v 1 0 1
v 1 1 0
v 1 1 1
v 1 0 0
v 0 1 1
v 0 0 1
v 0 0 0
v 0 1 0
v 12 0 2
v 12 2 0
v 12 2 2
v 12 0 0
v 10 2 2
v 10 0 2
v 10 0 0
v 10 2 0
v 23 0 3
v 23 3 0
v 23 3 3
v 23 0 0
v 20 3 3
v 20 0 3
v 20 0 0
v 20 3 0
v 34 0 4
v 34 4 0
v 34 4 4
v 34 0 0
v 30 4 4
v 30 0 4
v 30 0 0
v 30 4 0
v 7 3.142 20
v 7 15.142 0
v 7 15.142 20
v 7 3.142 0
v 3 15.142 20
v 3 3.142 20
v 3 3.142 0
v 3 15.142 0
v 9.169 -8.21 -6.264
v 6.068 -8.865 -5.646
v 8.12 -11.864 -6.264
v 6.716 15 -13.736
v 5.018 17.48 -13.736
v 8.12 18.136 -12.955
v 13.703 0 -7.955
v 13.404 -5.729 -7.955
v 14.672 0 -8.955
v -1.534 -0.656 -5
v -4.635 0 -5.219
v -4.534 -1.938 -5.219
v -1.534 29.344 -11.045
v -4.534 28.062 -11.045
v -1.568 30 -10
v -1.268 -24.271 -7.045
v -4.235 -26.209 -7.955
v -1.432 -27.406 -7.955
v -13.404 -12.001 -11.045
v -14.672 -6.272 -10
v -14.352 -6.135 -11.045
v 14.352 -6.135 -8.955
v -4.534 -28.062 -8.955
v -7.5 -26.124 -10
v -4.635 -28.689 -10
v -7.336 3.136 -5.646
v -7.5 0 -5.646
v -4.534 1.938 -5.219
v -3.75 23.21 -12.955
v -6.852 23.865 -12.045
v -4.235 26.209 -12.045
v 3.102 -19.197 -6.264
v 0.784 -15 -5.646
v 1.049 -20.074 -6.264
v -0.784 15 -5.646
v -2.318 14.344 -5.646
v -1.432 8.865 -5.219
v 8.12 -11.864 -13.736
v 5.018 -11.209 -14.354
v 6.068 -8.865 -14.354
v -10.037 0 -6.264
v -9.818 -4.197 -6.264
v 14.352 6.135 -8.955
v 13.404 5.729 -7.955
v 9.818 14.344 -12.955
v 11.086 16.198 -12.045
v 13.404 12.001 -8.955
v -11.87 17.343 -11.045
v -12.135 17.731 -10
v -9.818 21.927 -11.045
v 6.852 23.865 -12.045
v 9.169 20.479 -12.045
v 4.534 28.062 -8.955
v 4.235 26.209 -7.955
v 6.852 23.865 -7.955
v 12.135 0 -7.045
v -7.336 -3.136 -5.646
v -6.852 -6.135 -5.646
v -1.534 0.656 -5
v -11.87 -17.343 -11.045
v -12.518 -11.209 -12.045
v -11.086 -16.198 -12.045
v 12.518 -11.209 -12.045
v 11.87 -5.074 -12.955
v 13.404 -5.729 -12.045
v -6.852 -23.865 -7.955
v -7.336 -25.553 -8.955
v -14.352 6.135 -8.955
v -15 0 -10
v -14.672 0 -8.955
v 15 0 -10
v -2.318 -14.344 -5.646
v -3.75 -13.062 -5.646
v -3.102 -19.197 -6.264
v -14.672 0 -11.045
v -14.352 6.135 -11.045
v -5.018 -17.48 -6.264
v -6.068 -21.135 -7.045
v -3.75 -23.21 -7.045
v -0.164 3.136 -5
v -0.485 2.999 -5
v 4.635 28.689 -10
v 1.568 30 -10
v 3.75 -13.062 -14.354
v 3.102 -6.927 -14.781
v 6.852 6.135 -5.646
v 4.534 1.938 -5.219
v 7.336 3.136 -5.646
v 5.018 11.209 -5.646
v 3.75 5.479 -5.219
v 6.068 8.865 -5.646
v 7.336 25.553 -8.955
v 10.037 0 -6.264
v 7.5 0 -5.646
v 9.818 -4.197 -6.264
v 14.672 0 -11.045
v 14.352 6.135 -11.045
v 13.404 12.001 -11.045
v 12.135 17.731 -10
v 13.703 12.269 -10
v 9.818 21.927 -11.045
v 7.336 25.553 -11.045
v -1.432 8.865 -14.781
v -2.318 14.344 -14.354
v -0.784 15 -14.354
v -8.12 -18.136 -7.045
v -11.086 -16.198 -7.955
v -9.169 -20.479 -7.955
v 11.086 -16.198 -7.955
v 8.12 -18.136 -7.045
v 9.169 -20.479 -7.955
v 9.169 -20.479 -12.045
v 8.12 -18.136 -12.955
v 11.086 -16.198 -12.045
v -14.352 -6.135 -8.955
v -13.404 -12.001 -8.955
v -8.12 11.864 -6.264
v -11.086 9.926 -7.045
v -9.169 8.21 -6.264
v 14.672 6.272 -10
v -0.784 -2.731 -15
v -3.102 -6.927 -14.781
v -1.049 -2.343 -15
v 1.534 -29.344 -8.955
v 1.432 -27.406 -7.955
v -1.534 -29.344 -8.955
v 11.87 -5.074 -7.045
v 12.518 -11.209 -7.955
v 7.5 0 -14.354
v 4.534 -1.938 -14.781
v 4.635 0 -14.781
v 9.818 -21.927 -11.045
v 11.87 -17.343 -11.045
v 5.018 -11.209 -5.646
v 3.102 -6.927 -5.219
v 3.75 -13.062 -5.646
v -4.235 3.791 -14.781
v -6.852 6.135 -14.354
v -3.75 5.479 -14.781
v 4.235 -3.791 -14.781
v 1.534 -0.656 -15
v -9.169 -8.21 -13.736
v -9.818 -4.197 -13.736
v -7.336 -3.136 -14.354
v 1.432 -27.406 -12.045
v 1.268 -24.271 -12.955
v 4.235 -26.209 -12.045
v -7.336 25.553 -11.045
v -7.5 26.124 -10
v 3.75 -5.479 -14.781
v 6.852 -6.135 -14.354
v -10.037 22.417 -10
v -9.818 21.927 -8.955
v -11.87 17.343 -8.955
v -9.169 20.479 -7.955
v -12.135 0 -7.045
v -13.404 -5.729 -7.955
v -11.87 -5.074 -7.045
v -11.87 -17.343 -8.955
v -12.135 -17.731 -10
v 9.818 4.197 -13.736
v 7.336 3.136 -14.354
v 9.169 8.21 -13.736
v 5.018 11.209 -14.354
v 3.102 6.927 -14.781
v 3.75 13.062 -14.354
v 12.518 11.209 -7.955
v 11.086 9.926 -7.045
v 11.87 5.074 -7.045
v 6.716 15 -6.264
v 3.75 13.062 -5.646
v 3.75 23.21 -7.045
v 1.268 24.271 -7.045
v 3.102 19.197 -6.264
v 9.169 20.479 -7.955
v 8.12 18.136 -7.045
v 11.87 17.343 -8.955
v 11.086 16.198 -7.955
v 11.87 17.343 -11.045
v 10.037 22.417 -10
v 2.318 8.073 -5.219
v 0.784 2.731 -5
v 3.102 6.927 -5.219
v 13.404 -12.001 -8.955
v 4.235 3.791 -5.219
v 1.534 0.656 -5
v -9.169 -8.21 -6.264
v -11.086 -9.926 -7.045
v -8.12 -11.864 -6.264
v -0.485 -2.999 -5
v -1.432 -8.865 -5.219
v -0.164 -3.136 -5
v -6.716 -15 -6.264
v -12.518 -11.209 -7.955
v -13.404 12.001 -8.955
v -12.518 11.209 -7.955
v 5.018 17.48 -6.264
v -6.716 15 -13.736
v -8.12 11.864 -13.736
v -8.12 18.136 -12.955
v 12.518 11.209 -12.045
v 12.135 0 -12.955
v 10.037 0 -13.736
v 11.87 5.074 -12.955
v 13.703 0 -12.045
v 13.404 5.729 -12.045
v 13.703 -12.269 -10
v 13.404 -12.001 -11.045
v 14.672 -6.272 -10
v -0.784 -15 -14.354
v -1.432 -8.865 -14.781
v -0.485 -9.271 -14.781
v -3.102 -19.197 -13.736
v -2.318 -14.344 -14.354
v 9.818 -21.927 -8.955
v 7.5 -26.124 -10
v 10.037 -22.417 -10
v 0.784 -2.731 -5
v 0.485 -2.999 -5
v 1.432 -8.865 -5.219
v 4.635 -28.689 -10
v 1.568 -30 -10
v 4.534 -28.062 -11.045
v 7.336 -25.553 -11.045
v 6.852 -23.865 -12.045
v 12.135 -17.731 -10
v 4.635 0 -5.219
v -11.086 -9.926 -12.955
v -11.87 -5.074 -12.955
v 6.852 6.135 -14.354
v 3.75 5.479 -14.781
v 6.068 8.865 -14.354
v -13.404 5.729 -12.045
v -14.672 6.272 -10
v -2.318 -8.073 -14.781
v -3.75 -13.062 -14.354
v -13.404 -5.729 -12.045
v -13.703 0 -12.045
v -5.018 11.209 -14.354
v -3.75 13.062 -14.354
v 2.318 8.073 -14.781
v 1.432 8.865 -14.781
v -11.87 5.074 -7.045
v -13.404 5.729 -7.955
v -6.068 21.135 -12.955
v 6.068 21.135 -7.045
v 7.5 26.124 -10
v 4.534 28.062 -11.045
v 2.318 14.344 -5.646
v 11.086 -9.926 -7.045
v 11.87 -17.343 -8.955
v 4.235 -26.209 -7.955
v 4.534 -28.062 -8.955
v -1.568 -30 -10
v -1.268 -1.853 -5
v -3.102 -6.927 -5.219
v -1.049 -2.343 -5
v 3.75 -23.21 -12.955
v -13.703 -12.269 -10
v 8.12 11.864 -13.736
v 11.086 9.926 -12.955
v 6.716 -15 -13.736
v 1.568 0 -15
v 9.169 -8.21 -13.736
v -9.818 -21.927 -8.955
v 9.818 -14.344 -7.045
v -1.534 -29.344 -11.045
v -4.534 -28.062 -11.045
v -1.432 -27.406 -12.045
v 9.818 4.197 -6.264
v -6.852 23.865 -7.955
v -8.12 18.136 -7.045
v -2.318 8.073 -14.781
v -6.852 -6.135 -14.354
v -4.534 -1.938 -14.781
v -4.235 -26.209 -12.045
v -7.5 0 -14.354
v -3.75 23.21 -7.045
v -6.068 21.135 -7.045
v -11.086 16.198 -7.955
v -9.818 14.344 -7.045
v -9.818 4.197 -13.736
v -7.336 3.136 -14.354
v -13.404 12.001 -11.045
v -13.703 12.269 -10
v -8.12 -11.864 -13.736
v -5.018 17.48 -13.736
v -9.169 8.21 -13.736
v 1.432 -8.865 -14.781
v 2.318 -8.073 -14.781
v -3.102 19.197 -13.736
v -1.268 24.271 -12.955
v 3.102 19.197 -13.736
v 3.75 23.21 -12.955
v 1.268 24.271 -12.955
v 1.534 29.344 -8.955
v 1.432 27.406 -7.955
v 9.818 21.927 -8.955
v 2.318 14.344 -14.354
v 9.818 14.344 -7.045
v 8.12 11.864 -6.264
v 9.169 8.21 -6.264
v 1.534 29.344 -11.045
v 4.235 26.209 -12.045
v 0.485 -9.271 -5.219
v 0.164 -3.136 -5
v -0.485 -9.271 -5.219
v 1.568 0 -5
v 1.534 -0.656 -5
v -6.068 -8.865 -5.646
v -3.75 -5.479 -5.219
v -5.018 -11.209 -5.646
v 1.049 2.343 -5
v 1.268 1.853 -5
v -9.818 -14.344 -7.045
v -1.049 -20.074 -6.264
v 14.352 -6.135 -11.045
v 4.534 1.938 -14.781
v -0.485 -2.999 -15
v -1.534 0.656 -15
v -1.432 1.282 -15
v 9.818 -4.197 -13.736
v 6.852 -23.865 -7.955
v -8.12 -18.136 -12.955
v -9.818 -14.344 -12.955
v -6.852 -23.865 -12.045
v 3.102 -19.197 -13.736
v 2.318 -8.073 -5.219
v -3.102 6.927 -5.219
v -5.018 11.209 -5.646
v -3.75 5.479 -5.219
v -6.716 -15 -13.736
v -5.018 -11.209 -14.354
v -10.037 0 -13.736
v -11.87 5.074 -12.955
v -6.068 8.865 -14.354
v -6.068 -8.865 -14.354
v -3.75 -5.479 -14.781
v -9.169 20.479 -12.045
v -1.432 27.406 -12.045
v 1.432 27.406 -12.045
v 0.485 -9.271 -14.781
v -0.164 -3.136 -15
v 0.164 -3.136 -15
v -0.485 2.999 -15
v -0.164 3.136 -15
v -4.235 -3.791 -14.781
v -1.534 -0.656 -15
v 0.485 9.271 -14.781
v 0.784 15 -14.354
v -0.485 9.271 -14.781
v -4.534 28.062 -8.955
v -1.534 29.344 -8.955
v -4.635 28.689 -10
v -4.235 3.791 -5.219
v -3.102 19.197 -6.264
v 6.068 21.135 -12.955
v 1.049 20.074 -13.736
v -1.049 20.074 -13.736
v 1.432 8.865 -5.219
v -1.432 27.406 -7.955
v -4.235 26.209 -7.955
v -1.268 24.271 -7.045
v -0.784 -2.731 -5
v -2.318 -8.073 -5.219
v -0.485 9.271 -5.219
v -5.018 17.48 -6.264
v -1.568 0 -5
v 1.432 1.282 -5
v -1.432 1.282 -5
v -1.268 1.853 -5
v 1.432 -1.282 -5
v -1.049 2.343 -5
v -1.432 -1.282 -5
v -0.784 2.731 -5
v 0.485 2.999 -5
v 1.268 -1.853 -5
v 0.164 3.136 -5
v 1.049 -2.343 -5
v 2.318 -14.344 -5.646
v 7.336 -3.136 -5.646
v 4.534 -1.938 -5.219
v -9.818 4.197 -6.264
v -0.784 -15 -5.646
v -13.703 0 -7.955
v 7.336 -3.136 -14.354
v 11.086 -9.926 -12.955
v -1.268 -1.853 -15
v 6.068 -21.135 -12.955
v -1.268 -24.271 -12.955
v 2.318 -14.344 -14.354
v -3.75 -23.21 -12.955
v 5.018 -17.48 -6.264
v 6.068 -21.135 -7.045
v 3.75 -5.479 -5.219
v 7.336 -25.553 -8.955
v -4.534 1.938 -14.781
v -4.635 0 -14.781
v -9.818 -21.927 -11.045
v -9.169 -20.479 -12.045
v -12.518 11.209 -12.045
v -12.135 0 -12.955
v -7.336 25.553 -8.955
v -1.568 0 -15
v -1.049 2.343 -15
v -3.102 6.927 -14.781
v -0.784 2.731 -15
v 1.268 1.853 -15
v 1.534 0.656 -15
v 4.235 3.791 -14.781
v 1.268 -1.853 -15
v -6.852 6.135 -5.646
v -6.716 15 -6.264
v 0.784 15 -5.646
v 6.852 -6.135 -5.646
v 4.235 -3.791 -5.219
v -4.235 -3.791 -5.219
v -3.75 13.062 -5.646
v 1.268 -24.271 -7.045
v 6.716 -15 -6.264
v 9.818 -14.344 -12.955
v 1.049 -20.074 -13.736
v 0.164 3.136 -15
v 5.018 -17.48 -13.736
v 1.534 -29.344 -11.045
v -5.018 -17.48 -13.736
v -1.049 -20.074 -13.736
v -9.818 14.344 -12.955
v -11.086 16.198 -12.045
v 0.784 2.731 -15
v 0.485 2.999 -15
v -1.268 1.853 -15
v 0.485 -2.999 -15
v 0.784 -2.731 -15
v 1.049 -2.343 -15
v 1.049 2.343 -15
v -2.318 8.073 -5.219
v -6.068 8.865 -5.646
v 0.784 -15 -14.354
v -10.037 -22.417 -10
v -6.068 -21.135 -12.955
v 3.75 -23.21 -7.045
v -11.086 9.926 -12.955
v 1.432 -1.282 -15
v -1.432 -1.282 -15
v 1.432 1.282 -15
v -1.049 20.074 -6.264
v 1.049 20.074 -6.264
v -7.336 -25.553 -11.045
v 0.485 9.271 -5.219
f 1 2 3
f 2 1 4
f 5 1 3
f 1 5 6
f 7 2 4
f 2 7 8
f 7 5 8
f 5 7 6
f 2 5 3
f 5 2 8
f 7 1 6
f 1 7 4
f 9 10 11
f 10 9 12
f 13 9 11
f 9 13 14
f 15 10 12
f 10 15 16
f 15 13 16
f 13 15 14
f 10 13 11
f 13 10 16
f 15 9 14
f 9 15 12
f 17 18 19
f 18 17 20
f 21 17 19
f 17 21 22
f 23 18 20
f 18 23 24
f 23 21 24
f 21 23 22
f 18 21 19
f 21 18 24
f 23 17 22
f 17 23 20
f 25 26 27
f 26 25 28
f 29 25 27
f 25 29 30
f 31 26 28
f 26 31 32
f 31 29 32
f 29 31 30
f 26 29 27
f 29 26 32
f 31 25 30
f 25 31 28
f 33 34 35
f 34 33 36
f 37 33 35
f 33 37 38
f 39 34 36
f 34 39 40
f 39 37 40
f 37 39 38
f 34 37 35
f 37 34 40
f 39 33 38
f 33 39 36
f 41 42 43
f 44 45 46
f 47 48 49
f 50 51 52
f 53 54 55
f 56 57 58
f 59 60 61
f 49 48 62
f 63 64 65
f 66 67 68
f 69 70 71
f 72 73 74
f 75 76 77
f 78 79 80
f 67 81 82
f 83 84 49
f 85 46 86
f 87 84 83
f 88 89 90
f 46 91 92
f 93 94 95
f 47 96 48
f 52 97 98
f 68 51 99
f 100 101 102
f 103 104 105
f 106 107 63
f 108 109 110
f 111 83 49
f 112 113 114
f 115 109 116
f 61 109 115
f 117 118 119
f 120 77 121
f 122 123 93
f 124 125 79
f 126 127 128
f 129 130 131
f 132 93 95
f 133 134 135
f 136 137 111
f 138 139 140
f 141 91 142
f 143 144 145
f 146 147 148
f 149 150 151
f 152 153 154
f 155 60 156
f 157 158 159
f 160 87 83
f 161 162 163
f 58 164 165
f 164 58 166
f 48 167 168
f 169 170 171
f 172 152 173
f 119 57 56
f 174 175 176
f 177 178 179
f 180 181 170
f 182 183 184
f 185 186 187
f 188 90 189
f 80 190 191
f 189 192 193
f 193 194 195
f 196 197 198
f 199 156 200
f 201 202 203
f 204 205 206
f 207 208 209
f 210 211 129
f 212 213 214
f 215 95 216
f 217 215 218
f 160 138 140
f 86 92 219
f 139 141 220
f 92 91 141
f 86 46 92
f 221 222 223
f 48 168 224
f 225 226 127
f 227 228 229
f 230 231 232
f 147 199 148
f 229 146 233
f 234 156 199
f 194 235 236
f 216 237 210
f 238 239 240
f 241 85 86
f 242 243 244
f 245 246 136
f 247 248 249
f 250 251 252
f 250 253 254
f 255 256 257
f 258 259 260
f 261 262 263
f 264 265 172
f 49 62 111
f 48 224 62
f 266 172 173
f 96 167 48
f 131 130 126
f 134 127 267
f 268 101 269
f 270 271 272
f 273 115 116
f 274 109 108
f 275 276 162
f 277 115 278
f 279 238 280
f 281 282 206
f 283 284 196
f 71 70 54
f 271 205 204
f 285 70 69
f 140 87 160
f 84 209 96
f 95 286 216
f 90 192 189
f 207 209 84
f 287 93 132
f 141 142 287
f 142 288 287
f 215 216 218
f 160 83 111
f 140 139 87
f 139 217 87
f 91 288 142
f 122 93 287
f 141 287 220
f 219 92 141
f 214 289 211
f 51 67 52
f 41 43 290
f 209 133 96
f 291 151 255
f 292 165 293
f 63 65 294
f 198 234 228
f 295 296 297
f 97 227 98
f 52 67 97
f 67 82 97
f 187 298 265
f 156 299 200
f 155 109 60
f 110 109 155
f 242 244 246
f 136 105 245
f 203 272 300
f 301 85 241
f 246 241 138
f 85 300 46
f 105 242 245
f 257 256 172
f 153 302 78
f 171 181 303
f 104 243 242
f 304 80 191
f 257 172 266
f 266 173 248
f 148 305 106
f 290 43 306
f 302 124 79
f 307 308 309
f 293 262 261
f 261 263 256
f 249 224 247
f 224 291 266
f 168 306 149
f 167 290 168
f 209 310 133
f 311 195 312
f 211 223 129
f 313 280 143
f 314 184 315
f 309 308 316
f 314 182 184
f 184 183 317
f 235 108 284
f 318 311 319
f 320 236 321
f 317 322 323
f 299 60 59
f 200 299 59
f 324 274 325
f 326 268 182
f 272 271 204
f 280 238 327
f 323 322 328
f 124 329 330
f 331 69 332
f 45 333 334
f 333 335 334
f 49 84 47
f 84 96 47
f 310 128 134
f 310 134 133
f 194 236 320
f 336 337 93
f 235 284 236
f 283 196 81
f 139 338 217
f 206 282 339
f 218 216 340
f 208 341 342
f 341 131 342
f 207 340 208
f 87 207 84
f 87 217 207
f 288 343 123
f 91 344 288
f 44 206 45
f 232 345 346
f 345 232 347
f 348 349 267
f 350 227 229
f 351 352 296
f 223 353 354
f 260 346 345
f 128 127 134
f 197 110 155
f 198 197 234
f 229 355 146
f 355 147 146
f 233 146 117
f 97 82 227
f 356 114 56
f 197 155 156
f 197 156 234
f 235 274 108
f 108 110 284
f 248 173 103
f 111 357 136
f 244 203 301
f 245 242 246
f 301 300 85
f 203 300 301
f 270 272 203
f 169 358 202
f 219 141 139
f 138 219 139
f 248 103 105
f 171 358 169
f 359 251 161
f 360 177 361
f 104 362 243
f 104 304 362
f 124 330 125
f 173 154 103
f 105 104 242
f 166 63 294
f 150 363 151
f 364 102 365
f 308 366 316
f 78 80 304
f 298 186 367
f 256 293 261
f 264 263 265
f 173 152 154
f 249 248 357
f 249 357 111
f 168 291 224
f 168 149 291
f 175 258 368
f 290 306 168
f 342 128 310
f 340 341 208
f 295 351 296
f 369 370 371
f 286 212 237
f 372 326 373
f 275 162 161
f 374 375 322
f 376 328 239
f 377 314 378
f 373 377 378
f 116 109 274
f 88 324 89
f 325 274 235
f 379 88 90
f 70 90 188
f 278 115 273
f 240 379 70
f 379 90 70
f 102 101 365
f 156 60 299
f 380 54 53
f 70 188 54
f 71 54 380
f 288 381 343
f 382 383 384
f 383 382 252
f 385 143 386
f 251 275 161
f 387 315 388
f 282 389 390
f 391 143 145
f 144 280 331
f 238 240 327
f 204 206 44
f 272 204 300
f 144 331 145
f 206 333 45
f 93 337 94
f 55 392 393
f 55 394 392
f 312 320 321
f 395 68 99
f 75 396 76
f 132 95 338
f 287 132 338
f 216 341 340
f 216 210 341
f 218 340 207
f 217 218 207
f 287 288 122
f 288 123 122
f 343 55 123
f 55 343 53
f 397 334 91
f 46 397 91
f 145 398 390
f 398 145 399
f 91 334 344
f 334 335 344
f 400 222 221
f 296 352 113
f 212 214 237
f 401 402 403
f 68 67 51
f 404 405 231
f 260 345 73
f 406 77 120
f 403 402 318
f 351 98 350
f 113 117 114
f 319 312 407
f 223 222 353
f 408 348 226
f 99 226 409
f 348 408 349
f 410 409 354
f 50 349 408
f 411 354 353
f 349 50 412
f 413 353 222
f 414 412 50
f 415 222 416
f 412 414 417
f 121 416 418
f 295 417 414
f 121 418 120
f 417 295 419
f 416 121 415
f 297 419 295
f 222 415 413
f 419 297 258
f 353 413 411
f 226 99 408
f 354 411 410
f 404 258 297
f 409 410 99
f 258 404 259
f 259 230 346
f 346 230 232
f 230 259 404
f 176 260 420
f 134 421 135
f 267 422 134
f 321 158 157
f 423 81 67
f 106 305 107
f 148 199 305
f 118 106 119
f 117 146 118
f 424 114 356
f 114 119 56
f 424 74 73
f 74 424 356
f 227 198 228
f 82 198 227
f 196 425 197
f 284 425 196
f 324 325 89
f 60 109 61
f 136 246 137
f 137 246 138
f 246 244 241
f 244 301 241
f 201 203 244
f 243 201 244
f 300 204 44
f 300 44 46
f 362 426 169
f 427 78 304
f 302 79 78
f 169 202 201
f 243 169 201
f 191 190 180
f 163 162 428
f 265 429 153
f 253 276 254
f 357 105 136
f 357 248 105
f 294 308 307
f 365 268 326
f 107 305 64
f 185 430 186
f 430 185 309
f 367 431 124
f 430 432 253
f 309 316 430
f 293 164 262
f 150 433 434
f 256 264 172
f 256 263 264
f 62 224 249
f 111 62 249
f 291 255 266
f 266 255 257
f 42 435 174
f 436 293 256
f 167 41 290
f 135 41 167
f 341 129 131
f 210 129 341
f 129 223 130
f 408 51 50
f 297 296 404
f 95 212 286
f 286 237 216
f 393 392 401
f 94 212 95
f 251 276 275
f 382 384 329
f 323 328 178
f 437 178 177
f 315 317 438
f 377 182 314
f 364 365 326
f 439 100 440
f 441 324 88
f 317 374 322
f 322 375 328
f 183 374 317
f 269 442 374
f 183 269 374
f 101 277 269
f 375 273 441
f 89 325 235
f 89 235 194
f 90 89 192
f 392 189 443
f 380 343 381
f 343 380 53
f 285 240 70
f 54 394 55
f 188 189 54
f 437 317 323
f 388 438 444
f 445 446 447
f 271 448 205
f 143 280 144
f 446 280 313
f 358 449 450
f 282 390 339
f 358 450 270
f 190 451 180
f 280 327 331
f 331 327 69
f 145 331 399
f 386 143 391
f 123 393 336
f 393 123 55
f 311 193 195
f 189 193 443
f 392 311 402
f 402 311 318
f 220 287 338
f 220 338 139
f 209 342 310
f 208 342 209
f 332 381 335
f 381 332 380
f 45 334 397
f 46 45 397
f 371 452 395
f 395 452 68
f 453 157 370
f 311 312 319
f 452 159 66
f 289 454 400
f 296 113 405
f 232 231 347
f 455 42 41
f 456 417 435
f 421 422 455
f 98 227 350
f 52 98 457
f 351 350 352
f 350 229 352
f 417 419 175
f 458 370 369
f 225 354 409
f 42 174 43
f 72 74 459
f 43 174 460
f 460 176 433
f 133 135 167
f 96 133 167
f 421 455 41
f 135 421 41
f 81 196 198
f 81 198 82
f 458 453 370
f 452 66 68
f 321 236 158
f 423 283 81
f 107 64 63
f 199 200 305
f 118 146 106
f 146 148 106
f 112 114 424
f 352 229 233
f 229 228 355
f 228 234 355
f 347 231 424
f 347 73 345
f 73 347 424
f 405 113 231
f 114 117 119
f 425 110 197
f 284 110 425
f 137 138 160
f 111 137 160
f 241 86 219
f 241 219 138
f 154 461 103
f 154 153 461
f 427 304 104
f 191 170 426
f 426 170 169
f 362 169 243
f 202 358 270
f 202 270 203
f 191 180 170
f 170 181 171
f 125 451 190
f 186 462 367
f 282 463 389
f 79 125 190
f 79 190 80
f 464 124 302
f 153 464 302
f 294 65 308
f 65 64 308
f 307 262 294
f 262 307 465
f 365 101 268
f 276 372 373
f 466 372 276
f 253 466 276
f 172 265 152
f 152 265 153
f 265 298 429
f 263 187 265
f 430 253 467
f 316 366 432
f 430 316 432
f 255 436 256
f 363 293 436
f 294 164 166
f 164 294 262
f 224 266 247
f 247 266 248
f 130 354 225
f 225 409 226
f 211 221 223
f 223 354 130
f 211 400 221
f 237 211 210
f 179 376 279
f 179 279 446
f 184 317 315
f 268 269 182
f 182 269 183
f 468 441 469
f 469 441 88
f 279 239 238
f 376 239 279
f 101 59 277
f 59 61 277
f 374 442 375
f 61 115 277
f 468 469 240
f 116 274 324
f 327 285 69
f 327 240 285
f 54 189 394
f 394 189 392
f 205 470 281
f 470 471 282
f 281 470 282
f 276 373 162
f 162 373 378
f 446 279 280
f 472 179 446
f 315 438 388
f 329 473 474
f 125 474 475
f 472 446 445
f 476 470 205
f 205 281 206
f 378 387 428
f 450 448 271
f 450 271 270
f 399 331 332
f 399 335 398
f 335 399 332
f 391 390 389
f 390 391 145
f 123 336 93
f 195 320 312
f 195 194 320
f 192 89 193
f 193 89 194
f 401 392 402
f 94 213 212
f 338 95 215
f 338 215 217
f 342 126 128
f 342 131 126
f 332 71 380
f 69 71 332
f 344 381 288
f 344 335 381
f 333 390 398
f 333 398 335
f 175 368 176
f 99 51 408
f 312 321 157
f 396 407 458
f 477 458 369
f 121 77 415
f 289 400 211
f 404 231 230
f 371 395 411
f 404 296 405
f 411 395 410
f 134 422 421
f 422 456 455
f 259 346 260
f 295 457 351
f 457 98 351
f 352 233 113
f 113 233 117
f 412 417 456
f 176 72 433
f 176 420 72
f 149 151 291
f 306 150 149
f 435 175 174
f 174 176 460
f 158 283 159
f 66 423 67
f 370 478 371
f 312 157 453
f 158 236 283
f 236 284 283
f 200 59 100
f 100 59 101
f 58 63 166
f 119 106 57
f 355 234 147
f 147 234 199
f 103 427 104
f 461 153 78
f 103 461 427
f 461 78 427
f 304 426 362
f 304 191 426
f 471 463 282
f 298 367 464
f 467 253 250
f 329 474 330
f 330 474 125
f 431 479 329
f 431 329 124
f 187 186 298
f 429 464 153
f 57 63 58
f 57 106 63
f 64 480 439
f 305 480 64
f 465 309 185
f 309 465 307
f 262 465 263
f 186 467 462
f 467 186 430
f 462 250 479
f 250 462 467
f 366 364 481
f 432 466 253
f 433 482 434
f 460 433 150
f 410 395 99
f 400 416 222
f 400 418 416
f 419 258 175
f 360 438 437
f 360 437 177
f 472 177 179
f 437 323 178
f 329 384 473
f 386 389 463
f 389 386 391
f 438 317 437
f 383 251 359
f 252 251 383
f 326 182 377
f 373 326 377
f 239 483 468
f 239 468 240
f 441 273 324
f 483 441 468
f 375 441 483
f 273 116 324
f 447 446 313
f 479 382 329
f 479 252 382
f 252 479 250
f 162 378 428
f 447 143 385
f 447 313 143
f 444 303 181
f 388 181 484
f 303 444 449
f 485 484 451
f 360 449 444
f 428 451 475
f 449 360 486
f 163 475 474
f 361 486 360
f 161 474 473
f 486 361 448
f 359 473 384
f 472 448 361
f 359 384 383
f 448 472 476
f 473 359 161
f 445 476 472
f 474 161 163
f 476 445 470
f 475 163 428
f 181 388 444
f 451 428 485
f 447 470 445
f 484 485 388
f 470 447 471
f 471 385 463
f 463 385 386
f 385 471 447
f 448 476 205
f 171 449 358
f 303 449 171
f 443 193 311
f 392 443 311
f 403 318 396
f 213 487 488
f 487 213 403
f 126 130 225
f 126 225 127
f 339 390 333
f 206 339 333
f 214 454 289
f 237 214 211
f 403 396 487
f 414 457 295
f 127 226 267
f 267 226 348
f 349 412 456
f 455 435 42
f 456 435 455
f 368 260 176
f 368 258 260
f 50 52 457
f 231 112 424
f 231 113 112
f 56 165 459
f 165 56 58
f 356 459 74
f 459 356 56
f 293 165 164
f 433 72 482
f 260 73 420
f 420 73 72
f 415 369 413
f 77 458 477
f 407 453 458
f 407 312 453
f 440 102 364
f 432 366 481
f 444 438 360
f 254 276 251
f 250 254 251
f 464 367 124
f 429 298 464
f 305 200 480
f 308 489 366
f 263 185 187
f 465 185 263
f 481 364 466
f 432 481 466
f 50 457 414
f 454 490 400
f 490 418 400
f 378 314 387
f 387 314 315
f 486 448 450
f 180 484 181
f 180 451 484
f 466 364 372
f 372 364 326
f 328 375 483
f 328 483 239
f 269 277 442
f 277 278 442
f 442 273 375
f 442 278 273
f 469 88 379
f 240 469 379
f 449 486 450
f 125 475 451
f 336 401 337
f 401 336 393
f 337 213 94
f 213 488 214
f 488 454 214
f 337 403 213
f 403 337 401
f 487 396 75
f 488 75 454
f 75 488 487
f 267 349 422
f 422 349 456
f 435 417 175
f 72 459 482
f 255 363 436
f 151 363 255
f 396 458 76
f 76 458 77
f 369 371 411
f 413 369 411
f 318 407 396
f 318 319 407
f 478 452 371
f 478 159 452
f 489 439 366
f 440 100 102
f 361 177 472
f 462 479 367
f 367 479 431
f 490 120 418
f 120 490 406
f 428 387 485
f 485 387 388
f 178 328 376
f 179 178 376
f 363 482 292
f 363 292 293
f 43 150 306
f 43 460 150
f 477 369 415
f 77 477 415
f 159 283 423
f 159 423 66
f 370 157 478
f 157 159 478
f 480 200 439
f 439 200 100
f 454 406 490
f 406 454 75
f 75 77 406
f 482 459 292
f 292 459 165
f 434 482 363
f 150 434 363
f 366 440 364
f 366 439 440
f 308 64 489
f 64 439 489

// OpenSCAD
translate([x,PI,0]) {
  color([1,0,0]) {
    scale([2,4,5]) cube([2,3,4]);
  }
};
translate([0,0,-10]) resize(newsize=[30,60,10]) sphere(r=10);

color("blue") for (i=[0:3]) {
   translate([i*10,0,0])
     cube(i+1);
}

echo( "\u03A9 x=", x, sv[3] );
x=3;
// x=5;
sv = ["aaa","bbb", "ccc", "ddd" ];
